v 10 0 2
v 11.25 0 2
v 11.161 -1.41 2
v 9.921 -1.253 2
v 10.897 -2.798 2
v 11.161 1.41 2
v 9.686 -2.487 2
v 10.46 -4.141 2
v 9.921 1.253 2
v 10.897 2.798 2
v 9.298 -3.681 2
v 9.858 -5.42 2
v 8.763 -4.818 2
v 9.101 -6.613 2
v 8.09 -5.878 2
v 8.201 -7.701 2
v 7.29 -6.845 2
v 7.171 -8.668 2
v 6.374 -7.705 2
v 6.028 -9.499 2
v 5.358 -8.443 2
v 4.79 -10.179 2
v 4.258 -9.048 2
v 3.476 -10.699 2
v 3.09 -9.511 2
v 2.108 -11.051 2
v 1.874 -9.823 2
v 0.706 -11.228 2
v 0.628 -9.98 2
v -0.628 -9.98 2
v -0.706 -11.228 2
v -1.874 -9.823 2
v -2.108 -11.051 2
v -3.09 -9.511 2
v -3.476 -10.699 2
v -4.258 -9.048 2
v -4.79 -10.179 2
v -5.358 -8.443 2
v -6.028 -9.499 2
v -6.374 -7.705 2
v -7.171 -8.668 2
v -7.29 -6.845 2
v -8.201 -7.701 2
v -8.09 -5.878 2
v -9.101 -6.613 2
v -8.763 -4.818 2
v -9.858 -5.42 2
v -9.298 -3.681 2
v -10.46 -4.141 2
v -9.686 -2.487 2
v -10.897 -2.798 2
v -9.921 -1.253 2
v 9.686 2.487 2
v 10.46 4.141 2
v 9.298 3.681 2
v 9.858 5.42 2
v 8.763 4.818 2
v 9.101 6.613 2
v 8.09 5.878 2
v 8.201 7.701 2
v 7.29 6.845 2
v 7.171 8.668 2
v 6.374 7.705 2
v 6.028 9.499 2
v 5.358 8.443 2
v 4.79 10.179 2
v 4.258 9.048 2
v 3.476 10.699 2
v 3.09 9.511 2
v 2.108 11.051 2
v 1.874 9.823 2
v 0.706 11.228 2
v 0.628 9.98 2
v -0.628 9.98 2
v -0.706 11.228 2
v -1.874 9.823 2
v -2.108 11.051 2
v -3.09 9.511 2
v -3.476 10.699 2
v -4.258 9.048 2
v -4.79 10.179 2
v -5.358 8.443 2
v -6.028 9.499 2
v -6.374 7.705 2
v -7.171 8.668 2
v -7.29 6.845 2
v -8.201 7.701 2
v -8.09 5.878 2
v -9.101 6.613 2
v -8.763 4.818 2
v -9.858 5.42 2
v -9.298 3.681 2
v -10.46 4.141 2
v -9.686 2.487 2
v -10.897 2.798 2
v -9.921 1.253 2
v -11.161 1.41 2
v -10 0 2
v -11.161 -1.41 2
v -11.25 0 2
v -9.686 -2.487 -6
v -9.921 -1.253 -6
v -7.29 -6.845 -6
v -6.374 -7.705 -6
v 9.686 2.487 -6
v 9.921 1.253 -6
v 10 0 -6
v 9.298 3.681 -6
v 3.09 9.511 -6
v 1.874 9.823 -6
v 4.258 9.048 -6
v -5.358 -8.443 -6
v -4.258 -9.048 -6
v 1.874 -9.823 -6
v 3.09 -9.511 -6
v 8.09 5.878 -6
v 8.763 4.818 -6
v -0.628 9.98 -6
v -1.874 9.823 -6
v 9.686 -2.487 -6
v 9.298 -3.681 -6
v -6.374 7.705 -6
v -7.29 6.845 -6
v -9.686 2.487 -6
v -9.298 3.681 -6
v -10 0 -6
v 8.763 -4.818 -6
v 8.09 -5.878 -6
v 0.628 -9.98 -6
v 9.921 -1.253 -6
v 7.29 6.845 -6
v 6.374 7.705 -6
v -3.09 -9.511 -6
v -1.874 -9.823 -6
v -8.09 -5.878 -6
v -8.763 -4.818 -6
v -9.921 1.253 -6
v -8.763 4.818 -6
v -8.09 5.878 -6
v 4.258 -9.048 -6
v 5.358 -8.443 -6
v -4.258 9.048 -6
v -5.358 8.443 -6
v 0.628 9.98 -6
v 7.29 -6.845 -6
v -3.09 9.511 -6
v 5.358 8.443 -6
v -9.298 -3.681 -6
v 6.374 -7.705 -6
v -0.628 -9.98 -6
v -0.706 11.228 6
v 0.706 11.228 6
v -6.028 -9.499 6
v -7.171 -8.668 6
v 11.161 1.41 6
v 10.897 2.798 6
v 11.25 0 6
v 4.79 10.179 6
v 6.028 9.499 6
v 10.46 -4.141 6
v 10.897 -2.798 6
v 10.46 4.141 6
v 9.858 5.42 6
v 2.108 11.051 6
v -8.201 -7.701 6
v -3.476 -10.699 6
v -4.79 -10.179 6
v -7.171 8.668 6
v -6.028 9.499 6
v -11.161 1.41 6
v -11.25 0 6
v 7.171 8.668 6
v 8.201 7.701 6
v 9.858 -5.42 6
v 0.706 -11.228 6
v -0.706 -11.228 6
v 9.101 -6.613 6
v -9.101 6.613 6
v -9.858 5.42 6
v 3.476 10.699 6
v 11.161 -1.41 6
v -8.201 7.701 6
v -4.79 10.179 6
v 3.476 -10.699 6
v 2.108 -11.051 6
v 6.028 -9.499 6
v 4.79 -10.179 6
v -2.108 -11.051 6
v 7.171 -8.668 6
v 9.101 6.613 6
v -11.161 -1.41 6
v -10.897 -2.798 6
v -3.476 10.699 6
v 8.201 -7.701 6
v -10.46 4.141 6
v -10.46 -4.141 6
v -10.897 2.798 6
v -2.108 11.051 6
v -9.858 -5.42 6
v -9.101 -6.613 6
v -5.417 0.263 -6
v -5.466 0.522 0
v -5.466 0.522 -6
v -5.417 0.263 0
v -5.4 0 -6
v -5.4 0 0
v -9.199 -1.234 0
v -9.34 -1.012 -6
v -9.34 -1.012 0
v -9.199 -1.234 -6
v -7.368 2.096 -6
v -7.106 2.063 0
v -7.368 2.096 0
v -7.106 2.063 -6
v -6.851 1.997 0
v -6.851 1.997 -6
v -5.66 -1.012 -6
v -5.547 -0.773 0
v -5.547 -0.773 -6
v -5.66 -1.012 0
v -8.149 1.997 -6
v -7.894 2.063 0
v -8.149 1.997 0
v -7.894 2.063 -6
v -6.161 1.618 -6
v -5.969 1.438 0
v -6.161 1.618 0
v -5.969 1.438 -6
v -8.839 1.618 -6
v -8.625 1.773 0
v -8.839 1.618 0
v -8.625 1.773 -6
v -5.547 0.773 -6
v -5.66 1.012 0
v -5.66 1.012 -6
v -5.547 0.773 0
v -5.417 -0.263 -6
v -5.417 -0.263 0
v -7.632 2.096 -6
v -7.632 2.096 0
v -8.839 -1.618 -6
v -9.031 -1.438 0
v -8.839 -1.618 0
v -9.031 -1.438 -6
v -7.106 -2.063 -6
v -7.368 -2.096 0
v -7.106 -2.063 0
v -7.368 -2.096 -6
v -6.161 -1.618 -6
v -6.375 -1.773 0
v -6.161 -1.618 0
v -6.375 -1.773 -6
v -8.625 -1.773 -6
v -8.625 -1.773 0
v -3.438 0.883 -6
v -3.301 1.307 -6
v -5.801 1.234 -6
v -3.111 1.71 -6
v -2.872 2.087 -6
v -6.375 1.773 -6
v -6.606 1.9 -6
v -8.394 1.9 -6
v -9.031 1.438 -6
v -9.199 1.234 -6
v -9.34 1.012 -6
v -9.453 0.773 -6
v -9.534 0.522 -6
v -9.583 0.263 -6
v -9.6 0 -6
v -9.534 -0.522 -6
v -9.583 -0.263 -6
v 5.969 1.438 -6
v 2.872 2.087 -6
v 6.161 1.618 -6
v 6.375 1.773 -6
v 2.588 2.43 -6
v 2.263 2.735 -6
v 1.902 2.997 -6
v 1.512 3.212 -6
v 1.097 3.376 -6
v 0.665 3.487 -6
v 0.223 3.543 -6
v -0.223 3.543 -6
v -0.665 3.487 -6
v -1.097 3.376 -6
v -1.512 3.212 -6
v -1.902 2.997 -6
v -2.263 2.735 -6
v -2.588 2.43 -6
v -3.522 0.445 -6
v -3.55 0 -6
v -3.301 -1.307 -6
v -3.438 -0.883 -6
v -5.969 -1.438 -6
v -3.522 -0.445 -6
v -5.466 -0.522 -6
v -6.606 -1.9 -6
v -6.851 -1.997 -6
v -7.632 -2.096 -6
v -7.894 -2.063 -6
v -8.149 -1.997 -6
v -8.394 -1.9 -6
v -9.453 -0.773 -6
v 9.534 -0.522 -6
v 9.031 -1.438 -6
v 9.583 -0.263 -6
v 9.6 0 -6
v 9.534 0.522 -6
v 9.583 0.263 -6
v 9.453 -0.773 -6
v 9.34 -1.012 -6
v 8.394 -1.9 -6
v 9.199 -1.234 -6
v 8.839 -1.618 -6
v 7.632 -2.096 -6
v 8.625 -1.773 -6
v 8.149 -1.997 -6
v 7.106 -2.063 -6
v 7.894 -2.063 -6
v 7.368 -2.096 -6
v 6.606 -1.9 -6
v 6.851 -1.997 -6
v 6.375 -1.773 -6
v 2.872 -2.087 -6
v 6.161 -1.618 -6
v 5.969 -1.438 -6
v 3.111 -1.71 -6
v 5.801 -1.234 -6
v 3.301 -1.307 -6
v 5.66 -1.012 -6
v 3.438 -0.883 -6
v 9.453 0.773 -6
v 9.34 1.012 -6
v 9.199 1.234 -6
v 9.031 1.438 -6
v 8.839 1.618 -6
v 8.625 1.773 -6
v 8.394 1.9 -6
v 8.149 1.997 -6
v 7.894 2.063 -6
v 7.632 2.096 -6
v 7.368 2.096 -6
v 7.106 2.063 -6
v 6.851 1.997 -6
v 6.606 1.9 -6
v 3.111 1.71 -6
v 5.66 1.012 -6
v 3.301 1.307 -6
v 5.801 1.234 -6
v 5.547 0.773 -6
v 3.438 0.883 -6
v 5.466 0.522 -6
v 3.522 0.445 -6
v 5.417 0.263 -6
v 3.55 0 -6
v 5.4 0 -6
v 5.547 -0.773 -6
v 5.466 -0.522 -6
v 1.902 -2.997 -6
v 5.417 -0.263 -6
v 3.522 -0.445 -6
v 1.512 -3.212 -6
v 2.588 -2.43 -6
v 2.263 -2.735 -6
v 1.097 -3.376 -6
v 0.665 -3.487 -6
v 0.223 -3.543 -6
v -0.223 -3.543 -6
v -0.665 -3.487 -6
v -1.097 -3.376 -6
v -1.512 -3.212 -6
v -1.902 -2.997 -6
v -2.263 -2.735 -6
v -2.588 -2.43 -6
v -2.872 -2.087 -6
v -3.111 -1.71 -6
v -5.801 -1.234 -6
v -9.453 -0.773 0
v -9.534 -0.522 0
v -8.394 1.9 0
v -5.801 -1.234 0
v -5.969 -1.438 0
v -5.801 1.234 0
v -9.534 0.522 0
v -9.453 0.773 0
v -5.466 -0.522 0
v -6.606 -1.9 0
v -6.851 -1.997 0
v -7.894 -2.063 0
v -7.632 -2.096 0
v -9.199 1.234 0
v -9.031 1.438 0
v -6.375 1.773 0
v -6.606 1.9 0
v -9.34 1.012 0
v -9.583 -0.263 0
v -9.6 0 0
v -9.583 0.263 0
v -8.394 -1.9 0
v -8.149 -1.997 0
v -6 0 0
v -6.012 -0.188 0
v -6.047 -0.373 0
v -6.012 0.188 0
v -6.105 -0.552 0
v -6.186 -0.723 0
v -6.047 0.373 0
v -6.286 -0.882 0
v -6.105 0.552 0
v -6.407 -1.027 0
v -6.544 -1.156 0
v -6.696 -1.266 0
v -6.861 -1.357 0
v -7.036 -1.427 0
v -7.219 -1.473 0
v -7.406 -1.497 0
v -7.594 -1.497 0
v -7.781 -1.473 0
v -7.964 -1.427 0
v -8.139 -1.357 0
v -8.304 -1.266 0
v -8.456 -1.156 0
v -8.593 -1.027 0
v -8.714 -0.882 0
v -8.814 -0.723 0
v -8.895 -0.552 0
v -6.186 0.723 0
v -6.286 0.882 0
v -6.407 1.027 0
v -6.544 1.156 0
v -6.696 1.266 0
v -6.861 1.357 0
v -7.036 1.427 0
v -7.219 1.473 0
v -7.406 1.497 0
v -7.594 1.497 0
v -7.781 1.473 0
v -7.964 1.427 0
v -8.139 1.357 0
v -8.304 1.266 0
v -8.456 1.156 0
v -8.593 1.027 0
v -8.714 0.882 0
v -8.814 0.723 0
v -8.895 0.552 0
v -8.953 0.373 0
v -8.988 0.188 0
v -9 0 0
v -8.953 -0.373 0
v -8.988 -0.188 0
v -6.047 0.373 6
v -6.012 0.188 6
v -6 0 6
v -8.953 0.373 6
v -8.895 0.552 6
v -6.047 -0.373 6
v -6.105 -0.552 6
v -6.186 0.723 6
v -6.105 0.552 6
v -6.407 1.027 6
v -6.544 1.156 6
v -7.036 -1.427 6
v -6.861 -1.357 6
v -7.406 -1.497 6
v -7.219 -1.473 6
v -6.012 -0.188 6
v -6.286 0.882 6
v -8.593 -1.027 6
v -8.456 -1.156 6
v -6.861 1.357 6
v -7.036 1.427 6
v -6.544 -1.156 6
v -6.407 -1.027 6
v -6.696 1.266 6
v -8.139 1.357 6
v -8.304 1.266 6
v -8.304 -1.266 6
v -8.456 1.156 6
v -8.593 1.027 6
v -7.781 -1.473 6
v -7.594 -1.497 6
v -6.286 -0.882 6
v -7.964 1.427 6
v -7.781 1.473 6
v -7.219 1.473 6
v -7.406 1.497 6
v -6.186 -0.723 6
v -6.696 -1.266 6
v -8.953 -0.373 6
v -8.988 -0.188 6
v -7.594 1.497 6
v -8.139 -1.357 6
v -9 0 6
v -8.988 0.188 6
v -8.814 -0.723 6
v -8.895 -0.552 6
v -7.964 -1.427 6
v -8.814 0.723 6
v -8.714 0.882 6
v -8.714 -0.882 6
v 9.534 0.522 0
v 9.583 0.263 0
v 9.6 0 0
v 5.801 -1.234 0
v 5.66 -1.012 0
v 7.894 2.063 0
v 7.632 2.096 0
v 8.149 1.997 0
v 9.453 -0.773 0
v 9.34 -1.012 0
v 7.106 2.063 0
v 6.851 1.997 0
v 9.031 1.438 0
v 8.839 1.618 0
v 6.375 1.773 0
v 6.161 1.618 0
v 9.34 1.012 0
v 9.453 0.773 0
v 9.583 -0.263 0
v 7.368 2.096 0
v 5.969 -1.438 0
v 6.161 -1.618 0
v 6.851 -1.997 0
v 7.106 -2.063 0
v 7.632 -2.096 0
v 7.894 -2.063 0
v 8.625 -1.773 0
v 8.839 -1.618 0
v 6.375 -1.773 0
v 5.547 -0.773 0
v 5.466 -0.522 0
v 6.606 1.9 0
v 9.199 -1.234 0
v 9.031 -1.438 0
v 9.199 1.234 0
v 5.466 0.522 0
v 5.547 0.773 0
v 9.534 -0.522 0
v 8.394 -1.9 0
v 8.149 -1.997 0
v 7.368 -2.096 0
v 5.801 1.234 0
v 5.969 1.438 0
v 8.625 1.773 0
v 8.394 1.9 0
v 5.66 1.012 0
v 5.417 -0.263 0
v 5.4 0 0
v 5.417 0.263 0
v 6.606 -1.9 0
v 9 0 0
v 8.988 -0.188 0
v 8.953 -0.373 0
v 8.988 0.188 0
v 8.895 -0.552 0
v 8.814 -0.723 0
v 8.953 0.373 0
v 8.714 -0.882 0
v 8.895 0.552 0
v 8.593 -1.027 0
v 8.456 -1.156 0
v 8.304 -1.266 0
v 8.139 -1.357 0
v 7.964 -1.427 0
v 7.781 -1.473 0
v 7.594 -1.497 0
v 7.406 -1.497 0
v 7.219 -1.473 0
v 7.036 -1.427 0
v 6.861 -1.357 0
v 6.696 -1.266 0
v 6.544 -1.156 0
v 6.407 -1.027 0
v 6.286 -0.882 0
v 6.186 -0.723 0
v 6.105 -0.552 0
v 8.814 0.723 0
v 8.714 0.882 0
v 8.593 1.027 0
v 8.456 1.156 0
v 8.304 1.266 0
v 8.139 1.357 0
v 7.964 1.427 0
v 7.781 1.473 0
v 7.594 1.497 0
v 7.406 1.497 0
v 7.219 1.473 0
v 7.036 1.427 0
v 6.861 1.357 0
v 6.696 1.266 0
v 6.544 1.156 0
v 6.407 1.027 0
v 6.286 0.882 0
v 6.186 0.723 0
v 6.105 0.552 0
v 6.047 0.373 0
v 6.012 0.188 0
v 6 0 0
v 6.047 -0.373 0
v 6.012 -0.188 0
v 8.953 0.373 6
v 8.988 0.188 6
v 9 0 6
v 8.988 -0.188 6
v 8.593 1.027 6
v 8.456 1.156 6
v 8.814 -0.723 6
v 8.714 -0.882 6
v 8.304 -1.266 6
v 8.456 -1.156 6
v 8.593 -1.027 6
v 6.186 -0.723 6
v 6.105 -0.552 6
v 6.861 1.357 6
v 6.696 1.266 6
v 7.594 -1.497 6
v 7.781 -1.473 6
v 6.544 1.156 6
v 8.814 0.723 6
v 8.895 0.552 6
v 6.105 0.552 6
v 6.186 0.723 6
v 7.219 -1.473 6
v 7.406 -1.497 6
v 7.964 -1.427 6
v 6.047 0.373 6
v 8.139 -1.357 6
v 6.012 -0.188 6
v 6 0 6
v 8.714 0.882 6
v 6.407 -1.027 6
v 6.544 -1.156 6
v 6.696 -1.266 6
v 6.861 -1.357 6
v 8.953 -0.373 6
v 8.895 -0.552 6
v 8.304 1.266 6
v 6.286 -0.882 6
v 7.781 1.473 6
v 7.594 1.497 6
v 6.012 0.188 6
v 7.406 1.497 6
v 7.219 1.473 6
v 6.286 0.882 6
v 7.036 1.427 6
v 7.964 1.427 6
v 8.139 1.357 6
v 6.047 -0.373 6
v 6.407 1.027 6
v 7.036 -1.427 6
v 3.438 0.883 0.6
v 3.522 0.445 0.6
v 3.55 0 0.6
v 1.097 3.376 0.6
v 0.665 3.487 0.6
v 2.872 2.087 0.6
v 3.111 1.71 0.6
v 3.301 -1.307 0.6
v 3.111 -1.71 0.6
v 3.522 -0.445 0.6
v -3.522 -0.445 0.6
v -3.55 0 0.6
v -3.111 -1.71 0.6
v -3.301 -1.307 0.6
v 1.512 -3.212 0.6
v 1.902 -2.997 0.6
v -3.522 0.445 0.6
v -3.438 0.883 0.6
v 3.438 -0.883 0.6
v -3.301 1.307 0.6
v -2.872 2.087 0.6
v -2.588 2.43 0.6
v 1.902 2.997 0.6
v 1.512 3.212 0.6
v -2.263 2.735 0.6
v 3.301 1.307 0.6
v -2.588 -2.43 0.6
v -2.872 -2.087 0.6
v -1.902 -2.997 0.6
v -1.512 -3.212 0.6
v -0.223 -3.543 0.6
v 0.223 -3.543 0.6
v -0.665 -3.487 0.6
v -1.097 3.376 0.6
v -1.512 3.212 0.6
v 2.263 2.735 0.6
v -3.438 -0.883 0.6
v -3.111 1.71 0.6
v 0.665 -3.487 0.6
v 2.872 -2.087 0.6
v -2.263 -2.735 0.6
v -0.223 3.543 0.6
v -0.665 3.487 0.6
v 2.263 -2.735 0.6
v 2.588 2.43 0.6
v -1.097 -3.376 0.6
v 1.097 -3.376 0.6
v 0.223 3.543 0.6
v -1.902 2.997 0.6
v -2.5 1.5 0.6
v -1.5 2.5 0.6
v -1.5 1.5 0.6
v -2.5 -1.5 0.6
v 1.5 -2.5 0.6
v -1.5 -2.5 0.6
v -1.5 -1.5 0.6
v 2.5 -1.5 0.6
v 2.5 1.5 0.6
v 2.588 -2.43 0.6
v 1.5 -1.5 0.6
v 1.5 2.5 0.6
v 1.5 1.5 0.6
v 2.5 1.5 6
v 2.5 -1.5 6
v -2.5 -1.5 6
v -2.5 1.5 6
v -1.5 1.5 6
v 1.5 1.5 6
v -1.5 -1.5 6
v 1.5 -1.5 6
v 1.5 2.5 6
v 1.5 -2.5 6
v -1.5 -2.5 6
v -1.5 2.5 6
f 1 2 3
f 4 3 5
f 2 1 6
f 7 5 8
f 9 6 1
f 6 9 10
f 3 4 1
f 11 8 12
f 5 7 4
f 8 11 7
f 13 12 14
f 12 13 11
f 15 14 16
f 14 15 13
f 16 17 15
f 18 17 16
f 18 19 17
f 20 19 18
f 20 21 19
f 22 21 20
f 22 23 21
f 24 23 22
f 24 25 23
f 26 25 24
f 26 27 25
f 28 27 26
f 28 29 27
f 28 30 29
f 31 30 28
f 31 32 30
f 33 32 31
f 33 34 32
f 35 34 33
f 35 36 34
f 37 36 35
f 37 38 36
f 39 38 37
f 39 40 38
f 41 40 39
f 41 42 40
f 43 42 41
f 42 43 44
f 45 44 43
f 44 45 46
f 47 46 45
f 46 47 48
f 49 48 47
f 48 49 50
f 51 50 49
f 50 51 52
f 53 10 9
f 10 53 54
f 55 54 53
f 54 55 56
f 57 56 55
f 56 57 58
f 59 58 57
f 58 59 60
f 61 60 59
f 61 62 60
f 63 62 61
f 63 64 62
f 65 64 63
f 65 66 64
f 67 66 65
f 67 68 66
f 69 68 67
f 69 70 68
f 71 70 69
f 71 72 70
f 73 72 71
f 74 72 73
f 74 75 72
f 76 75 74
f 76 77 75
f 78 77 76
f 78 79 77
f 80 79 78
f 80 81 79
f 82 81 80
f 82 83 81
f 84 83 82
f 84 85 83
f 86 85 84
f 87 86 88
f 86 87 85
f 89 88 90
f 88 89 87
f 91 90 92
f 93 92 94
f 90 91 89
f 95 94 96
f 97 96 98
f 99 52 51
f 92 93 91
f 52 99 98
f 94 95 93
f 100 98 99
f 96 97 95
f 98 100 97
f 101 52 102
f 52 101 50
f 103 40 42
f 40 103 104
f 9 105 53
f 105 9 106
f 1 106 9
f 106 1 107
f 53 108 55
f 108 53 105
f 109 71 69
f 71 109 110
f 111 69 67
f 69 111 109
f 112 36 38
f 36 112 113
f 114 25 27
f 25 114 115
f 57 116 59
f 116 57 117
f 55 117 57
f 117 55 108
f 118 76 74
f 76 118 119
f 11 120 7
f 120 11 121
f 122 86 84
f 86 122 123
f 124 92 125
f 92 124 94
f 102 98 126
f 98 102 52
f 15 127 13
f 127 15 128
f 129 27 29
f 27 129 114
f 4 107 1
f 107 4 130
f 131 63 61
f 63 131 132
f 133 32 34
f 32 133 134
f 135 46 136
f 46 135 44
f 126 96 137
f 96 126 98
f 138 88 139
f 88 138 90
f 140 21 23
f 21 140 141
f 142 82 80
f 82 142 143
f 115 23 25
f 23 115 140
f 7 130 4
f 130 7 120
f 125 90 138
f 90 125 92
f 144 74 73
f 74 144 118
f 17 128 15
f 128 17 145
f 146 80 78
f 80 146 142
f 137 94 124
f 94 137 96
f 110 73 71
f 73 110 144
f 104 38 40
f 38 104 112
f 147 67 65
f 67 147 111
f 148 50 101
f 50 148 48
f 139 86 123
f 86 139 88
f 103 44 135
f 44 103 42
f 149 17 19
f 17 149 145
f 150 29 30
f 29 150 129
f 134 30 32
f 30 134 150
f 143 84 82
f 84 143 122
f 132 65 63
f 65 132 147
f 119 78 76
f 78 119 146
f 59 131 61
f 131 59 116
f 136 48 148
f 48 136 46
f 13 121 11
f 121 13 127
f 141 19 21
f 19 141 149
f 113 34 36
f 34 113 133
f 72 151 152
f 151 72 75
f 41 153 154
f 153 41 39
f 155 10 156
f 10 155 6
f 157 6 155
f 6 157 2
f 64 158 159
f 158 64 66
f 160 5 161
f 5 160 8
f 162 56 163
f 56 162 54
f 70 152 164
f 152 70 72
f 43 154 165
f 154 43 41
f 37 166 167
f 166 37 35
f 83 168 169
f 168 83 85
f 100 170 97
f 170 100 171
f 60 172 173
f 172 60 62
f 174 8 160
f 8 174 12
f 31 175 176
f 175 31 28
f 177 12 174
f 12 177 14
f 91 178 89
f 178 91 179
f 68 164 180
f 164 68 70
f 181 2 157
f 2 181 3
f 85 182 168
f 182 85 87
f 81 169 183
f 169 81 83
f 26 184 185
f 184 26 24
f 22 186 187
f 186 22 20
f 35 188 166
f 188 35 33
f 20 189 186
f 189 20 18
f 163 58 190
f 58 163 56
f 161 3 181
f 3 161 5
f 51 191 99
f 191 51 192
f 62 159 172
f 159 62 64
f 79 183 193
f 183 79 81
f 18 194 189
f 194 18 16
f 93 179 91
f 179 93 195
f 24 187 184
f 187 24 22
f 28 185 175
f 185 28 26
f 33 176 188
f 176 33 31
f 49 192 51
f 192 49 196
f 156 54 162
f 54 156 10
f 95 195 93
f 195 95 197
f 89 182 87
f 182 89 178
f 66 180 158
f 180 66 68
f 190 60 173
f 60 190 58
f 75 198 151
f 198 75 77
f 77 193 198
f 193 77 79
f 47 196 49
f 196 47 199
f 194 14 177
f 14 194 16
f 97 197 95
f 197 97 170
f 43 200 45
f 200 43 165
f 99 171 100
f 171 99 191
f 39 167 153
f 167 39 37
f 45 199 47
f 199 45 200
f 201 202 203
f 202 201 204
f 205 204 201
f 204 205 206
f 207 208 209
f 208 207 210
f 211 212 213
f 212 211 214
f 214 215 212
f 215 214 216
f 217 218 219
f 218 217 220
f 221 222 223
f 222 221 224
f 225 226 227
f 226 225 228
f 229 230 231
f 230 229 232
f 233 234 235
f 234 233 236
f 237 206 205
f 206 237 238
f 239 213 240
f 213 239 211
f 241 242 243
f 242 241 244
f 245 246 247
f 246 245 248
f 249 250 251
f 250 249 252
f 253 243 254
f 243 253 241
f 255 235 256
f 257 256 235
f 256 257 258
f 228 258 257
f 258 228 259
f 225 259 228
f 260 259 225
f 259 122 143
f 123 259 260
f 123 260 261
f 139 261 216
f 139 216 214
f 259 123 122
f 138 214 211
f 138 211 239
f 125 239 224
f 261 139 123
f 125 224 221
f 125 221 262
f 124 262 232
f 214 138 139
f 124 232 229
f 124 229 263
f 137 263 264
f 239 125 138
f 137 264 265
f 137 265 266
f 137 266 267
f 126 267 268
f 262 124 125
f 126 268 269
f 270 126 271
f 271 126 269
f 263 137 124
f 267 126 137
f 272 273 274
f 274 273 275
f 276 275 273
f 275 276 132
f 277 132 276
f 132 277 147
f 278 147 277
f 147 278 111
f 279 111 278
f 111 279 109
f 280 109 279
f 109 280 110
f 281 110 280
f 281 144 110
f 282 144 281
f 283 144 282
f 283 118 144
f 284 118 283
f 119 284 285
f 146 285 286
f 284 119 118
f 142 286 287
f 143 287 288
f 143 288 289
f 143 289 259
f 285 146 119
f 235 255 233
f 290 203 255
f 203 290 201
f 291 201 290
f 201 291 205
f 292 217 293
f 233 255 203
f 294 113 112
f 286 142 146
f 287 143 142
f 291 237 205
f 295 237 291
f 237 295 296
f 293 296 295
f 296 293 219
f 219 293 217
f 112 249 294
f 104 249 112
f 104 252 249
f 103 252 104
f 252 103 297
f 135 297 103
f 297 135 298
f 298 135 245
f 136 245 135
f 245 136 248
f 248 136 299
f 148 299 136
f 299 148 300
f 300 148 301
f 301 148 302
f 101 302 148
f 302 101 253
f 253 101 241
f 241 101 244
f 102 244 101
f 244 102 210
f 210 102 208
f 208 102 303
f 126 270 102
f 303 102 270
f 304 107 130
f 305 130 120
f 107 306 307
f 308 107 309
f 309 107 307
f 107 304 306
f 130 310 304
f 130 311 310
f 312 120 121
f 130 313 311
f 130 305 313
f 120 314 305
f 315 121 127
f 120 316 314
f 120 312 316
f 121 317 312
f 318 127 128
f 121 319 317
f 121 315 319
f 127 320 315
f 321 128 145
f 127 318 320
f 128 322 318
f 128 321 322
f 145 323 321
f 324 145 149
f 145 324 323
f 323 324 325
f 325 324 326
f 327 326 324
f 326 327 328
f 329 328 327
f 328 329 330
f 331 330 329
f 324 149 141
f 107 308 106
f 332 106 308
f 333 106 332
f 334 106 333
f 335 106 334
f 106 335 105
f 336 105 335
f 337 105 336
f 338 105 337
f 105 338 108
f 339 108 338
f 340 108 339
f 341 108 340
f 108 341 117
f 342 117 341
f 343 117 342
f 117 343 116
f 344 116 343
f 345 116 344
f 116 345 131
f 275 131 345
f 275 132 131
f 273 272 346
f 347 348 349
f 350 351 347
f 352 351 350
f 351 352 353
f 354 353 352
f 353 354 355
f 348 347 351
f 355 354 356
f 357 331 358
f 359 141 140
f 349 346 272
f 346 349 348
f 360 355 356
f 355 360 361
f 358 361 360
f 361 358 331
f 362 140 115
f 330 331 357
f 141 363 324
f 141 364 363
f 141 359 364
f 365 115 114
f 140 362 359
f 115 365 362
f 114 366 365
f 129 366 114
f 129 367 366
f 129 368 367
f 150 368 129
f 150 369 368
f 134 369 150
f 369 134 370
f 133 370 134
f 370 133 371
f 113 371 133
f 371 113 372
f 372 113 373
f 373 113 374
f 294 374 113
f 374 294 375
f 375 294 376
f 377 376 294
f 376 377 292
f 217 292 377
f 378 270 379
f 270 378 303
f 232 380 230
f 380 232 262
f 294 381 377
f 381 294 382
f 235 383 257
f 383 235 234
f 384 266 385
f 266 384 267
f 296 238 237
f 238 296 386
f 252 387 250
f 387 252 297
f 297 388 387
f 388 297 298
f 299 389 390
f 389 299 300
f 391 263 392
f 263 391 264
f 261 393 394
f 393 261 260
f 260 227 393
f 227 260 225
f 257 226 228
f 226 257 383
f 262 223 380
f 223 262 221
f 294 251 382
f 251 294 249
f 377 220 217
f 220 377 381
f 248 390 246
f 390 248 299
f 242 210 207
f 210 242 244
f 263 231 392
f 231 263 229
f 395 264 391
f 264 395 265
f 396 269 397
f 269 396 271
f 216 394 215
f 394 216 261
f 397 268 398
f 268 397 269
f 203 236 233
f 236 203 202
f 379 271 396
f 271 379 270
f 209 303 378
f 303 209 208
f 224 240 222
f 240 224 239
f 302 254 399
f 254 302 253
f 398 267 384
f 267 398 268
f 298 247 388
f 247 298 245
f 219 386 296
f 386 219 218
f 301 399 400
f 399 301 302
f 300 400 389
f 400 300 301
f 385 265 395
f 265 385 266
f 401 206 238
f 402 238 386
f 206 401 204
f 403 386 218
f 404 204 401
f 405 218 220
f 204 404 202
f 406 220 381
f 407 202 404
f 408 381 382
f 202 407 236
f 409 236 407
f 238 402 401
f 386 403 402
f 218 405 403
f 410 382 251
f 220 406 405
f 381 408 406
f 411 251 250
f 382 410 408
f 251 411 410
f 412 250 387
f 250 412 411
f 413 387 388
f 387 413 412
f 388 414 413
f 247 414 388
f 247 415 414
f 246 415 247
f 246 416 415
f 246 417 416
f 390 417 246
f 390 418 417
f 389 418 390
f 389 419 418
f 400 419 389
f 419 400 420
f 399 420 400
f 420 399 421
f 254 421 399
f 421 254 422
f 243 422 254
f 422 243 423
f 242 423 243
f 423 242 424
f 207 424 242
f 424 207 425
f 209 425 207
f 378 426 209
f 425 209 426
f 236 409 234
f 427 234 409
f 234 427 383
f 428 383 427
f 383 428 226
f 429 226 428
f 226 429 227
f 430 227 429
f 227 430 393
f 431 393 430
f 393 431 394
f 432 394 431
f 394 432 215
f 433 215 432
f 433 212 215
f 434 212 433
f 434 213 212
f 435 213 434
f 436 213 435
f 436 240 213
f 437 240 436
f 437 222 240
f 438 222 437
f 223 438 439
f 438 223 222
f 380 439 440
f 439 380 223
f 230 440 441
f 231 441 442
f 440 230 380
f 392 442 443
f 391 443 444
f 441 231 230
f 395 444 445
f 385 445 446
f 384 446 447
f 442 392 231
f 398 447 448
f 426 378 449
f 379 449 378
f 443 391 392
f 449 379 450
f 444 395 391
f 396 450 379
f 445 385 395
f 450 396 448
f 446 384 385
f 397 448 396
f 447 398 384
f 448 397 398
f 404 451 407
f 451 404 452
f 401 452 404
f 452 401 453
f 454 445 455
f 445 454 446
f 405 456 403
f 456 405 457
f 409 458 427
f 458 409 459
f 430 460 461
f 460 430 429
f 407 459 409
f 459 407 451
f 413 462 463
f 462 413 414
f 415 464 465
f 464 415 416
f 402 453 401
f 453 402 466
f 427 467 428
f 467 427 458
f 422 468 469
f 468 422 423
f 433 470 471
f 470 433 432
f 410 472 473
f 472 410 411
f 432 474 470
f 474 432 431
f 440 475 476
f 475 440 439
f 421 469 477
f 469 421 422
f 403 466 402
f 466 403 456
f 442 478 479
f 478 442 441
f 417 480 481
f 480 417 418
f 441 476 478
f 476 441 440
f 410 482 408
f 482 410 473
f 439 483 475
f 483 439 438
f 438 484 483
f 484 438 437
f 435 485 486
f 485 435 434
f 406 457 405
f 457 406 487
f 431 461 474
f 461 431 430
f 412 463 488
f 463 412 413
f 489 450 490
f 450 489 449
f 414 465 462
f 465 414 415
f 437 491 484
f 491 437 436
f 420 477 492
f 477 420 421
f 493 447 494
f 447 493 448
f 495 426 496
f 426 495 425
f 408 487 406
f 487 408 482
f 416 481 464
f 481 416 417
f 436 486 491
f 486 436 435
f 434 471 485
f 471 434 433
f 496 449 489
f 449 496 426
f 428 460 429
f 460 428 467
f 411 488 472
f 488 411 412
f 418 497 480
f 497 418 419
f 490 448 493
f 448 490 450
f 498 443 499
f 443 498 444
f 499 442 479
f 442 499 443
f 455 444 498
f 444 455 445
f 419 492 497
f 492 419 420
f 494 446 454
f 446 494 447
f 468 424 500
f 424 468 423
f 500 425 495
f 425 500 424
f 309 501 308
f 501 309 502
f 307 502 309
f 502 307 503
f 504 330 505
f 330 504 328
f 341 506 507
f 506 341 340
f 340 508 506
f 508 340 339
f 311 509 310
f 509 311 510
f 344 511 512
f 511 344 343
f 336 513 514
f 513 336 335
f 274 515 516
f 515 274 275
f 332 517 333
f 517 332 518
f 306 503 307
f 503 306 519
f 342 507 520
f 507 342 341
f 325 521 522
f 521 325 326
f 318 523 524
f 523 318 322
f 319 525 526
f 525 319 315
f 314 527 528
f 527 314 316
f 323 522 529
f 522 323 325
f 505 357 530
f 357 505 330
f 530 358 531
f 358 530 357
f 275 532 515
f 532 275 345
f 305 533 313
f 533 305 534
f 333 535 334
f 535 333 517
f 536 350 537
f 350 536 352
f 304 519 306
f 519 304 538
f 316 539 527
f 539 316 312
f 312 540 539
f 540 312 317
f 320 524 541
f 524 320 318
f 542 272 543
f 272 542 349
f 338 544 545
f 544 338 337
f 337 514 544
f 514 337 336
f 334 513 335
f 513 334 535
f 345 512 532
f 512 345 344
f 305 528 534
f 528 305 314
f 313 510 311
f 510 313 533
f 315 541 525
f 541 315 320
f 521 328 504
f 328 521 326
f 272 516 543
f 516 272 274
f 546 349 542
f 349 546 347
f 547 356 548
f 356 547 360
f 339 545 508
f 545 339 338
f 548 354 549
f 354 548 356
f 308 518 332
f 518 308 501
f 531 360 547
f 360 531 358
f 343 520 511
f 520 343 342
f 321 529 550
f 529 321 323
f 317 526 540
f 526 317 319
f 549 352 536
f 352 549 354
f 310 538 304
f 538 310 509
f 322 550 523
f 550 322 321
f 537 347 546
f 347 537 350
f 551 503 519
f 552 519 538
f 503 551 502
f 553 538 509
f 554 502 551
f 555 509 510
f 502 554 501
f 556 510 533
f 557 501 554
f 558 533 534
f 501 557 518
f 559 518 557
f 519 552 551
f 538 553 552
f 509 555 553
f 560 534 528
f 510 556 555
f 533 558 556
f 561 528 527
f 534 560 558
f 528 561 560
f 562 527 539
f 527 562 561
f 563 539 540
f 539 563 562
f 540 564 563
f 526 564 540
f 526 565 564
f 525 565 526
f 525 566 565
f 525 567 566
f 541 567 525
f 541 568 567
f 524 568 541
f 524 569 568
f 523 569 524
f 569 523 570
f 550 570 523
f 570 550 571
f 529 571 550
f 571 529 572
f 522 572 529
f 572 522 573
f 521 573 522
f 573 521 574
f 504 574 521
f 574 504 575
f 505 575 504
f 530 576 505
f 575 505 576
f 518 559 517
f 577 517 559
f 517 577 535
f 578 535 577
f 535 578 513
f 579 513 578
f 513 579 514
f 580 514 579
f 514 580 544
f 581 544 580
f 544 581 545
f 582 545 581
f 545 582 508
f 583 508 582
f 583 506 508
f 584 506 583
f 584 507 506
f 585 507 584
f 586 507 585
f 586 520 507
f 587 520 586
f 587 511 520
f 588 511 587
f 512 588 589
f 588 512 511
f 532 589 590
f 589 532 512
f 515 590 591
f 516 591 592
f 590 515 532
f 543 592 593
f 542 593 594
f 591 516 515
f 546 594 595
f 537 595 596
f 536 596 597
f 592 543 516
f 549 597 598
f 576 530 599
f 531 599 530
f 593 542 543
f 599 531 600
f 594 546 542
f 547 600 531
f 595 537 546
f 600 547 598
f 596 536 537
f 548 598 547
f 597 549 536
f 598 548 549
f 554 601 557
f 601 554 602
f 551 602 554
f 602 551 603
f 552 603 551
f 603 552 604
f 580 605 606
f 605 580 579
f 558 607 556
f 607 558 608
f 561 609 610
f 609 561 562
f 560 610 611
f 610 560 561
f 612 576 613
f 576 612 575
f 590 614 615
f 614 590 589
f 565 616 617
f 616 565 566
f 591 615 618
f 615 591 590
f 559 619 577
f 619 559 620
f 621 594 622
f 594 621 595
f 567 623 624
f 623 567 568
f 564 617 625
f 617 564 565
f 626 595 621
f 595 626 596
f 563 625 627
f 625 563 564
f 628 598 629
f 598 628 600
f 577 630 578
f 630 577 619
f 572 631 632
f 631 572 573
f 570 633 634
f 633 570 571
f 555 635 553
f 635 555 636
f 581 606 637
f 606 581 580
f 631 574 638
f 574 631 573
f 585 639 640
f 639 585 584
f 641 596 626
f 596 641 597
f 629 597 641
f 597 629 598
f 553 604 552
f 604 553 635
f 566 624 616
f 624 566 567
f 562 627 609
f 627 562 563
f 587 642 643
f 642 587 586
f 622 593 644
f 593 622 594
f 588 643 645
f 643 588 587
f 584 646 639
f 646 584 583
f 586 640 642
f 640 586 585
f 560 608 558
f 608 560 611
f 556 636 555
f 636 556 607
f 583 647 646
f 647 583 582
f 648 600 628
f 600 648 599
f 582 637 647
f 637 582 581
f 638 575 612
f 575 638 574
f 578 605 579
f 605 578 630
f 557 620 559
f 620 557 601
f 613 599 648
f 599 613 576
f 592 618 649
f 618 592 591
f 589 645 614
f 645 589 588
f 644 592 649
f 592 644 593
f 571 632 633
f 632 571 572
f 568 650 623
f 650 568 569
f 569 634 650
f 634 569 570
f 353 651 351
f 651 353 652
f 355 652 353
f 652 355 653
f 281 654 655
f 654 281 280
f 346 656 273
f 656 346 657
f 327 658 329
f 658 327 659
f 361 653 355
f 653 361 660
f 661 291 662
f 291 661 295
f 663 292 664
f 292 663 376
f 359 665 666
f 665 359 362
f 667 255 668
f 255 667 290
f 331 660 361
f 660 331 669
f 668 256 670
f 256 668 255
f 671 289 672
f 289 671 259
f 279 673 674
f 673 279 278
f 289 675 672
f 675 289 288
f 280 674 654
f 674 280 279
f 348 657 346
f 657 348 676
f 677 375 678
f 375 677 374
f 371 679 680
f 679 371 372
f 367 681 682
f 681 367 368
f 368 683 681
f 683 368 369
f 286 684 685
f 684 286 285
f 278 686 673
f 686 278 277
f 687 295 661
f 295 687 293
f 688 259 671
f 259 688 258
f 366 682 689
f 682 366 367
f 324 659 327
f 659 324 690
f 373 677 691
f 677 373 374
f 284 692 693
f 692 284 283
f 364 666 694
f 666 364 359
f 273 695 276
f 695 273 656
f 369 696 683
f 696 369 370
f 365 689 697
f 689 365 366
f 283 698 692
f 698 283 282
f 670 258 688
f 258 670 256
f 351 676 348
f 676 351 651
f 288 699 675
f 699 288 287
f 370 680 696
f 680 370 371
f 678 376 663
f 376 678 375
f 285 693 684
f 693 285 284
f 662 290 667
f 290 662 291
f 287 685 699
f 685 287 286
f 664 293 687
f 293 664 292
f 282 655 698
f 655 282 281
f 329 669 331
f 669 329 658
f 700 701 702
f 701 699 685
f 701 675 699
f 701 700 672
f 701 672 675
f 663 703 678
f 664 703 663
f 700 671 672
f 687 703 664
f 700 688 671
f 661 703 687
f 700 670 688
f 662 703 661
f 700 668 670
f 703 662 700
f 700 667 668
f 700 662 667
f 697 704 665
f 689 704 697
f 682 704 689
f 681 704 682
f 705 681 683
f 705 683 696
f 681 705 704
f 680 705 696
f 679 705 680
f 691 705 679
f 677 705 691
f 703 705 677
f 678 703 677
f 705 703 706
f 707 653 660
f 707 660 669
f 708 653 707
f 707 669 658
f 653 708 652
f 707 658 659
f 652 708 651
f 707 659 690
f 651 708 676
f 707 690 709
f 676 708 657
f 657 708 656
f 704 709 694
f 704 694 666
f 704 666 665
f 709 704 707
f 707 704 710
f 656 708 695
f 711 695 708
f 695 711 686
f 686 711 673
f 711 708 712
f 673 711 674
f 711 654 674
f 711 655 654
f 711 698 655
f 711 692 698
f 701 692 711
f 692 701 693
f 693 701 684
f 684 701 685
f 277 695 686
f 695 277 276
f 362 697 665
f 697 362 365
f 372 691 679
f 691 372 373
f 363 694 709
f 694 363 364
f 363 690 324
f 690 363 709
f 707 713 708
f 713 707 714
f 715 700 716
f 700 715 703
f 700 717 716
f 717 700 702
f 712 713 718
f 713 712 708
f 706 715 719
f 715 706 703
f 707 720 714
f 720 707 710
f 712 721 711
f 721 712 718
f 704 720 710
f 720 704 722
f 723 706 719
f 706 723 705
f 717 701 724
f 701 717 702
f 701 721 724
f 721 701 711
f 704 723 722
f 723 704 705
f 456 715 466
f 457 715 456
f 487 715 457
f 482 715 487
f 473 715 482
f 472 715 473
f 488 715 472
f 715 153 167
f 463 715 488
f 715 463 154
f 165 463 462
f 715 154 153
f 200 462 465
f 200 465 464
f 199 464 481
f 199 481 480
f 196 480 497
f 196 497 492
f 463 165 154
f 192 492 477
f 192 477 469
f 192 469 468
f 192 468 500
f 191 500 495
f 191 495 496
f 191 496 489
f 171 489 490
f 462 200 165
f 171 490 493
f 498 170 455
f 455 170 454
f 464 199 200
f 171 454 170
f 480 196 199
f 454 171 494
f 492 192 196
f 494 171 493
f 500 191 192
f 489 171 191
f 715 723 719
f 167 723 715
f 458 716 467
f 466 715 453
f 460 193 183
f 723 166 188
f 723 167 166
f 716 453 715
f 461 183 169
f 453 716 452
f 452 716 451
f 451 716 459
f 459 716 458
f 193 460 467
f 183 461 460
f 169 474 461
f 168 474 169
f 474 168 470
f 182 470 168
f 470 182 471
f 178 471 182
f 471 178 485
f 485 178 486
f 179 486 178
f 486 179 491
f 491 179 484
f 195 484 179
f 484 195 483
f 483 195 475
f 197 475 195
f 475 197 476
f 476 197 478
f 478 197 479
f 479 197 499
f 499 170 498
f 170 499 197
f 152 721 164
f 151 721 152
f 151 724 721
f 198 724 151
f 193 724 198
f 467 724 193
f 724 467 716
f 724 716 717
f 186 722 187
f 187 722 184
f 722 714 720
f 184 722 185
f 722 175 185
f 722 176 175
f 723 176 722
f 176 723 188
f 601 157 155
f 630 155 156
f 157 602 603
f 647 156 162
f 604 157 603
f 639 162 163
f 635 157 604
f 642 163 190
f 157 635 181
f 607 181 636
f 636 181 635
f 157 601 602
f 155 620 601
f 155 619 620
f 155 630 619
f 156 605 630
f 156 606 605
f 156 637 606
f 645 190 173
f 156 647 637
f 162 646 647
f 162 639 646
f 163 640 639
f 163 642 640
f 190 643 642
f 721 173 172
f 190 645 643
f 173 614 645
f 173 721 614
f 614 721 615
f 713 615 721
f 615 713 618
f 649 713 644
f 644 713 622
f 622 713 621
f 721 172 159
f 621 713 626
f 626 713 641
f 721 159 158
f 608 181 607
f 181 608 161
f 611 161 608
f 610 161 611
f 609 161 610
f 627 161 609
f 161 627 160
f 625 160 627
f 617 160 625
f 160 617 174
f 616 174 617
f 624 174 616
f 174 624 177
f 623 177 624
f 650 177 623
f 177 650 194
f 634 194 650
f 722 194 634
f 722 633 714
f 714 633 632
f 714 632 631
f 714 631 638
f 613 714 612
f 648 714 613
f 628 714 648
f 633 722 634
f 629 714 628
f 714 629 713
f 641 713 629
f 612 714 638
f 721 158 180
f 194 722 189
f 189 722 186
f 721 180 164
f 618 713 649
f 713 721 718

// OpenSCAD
$fn = 50;

difference() {
	union() {
		translate(v = [0, 0, 0]) {
			rotate(a = [0, 0, 0]) {
				difference() {
					union() {
						translate(v = [0, 0, -6.0]) {
							cylinder(h = 12, r = 12);
						}
					}
					union() {
						translate(v = [0, 0, 0]) {
							rotate(a = [0, 0, 0]) {
								difference() {
									union() {
										translate(v = [0, 0, -2.0]) {
											cylinder(h = 4, r = 13.5);
										}
									}
									union() {
										translate(v = [0, 0, -2.01]) {
											cylinder(h = 4.02, r = 10.0);
										}
									}
								}
							}
						}
						translate(v = [0, 0, -3]) {
							rotate(a = [0, 0, 0]) {
								difference() {
									union() {
										translate(v = [0, 0, -2.0]) {
											cylinder(h = 4, r = 13.5);
										}
									}
									union() {
										translate(v = [0, 0, -2.01]) {
											cylinder(h = 4.02, r = 10.0);
										}
									}
								}
							}
						}
						translate(v = [0, 0, -6]) {
							rotate(a = [0, 0, 0]) {
								difference() {
									union() {
										translate(v = [0, 0, -2.0]) {
											cylinder(h = 4, r = 13.5);
										}
									}
									union() {
										translate(v = [0, 0, -2.01]) {
											cylinder(h = 4.02, r = 10.0);
										}
									}
								}
							}
						}
						translate(v = [0, 0, 0]) {
							rotate(a = [0, 0, 0]) {
								difference() {
									union() {
										translate(v = [0, 0, -21.0]) {
											cylinder(h = 42, r = 12.25);
										}
									}
									union() {
										translate(v = [0, 0, -21.01]) {
											cylinder(h = 42.02, r = 11.25);
										}
									}
								}
							}
						}
						translate(v = [-15.0, -15.0, -100.0]) {
							cylinder(h = 200, r = 3.0);
						}
						translate(v = [-15.0, 15.0, -100.0]) {
							cylinder(h = 200, r = 3.0);
						}
						translate(v = [15.0, -15.0, -100.0]) {
							cylinder(h = 200, r = 3.0);
						}
						translate(v = [15.0, 15.0, -100.0]) {
							cylinder(h = 200, r = 3.0);
						}
						translate(v = [-7.5, 0, -6.0]) {
							cylinder(h = 6, r = 2.1);
						}
						translate(v = [-7.5, 0, -7.0]) {
							cylinder(h = 14, r = 1.5);
						}
						translate(v = [7.5, 0, -6.0]) {
							cylinder(h = 6, r = 2.1);
						}
						translate(v = [7.5, 0, -7.0]) {
							cylinder(h = 14, r = 1.5);
						}
						translate(v = [0, 0, -6.000000000000001]) {
							cylinder(h = 6.6, r = 3.55);
						}
						translate(v = [-2.5, -1.5, -7.0]) {
							cube(size = [5, 3, 14]);
						}
						translate(v = [-1.5, -2.5, -7.0]) {
							cube(size = [3, 5, 14]);
						}
					}
				}
			}
		}
	}
	union();
}
